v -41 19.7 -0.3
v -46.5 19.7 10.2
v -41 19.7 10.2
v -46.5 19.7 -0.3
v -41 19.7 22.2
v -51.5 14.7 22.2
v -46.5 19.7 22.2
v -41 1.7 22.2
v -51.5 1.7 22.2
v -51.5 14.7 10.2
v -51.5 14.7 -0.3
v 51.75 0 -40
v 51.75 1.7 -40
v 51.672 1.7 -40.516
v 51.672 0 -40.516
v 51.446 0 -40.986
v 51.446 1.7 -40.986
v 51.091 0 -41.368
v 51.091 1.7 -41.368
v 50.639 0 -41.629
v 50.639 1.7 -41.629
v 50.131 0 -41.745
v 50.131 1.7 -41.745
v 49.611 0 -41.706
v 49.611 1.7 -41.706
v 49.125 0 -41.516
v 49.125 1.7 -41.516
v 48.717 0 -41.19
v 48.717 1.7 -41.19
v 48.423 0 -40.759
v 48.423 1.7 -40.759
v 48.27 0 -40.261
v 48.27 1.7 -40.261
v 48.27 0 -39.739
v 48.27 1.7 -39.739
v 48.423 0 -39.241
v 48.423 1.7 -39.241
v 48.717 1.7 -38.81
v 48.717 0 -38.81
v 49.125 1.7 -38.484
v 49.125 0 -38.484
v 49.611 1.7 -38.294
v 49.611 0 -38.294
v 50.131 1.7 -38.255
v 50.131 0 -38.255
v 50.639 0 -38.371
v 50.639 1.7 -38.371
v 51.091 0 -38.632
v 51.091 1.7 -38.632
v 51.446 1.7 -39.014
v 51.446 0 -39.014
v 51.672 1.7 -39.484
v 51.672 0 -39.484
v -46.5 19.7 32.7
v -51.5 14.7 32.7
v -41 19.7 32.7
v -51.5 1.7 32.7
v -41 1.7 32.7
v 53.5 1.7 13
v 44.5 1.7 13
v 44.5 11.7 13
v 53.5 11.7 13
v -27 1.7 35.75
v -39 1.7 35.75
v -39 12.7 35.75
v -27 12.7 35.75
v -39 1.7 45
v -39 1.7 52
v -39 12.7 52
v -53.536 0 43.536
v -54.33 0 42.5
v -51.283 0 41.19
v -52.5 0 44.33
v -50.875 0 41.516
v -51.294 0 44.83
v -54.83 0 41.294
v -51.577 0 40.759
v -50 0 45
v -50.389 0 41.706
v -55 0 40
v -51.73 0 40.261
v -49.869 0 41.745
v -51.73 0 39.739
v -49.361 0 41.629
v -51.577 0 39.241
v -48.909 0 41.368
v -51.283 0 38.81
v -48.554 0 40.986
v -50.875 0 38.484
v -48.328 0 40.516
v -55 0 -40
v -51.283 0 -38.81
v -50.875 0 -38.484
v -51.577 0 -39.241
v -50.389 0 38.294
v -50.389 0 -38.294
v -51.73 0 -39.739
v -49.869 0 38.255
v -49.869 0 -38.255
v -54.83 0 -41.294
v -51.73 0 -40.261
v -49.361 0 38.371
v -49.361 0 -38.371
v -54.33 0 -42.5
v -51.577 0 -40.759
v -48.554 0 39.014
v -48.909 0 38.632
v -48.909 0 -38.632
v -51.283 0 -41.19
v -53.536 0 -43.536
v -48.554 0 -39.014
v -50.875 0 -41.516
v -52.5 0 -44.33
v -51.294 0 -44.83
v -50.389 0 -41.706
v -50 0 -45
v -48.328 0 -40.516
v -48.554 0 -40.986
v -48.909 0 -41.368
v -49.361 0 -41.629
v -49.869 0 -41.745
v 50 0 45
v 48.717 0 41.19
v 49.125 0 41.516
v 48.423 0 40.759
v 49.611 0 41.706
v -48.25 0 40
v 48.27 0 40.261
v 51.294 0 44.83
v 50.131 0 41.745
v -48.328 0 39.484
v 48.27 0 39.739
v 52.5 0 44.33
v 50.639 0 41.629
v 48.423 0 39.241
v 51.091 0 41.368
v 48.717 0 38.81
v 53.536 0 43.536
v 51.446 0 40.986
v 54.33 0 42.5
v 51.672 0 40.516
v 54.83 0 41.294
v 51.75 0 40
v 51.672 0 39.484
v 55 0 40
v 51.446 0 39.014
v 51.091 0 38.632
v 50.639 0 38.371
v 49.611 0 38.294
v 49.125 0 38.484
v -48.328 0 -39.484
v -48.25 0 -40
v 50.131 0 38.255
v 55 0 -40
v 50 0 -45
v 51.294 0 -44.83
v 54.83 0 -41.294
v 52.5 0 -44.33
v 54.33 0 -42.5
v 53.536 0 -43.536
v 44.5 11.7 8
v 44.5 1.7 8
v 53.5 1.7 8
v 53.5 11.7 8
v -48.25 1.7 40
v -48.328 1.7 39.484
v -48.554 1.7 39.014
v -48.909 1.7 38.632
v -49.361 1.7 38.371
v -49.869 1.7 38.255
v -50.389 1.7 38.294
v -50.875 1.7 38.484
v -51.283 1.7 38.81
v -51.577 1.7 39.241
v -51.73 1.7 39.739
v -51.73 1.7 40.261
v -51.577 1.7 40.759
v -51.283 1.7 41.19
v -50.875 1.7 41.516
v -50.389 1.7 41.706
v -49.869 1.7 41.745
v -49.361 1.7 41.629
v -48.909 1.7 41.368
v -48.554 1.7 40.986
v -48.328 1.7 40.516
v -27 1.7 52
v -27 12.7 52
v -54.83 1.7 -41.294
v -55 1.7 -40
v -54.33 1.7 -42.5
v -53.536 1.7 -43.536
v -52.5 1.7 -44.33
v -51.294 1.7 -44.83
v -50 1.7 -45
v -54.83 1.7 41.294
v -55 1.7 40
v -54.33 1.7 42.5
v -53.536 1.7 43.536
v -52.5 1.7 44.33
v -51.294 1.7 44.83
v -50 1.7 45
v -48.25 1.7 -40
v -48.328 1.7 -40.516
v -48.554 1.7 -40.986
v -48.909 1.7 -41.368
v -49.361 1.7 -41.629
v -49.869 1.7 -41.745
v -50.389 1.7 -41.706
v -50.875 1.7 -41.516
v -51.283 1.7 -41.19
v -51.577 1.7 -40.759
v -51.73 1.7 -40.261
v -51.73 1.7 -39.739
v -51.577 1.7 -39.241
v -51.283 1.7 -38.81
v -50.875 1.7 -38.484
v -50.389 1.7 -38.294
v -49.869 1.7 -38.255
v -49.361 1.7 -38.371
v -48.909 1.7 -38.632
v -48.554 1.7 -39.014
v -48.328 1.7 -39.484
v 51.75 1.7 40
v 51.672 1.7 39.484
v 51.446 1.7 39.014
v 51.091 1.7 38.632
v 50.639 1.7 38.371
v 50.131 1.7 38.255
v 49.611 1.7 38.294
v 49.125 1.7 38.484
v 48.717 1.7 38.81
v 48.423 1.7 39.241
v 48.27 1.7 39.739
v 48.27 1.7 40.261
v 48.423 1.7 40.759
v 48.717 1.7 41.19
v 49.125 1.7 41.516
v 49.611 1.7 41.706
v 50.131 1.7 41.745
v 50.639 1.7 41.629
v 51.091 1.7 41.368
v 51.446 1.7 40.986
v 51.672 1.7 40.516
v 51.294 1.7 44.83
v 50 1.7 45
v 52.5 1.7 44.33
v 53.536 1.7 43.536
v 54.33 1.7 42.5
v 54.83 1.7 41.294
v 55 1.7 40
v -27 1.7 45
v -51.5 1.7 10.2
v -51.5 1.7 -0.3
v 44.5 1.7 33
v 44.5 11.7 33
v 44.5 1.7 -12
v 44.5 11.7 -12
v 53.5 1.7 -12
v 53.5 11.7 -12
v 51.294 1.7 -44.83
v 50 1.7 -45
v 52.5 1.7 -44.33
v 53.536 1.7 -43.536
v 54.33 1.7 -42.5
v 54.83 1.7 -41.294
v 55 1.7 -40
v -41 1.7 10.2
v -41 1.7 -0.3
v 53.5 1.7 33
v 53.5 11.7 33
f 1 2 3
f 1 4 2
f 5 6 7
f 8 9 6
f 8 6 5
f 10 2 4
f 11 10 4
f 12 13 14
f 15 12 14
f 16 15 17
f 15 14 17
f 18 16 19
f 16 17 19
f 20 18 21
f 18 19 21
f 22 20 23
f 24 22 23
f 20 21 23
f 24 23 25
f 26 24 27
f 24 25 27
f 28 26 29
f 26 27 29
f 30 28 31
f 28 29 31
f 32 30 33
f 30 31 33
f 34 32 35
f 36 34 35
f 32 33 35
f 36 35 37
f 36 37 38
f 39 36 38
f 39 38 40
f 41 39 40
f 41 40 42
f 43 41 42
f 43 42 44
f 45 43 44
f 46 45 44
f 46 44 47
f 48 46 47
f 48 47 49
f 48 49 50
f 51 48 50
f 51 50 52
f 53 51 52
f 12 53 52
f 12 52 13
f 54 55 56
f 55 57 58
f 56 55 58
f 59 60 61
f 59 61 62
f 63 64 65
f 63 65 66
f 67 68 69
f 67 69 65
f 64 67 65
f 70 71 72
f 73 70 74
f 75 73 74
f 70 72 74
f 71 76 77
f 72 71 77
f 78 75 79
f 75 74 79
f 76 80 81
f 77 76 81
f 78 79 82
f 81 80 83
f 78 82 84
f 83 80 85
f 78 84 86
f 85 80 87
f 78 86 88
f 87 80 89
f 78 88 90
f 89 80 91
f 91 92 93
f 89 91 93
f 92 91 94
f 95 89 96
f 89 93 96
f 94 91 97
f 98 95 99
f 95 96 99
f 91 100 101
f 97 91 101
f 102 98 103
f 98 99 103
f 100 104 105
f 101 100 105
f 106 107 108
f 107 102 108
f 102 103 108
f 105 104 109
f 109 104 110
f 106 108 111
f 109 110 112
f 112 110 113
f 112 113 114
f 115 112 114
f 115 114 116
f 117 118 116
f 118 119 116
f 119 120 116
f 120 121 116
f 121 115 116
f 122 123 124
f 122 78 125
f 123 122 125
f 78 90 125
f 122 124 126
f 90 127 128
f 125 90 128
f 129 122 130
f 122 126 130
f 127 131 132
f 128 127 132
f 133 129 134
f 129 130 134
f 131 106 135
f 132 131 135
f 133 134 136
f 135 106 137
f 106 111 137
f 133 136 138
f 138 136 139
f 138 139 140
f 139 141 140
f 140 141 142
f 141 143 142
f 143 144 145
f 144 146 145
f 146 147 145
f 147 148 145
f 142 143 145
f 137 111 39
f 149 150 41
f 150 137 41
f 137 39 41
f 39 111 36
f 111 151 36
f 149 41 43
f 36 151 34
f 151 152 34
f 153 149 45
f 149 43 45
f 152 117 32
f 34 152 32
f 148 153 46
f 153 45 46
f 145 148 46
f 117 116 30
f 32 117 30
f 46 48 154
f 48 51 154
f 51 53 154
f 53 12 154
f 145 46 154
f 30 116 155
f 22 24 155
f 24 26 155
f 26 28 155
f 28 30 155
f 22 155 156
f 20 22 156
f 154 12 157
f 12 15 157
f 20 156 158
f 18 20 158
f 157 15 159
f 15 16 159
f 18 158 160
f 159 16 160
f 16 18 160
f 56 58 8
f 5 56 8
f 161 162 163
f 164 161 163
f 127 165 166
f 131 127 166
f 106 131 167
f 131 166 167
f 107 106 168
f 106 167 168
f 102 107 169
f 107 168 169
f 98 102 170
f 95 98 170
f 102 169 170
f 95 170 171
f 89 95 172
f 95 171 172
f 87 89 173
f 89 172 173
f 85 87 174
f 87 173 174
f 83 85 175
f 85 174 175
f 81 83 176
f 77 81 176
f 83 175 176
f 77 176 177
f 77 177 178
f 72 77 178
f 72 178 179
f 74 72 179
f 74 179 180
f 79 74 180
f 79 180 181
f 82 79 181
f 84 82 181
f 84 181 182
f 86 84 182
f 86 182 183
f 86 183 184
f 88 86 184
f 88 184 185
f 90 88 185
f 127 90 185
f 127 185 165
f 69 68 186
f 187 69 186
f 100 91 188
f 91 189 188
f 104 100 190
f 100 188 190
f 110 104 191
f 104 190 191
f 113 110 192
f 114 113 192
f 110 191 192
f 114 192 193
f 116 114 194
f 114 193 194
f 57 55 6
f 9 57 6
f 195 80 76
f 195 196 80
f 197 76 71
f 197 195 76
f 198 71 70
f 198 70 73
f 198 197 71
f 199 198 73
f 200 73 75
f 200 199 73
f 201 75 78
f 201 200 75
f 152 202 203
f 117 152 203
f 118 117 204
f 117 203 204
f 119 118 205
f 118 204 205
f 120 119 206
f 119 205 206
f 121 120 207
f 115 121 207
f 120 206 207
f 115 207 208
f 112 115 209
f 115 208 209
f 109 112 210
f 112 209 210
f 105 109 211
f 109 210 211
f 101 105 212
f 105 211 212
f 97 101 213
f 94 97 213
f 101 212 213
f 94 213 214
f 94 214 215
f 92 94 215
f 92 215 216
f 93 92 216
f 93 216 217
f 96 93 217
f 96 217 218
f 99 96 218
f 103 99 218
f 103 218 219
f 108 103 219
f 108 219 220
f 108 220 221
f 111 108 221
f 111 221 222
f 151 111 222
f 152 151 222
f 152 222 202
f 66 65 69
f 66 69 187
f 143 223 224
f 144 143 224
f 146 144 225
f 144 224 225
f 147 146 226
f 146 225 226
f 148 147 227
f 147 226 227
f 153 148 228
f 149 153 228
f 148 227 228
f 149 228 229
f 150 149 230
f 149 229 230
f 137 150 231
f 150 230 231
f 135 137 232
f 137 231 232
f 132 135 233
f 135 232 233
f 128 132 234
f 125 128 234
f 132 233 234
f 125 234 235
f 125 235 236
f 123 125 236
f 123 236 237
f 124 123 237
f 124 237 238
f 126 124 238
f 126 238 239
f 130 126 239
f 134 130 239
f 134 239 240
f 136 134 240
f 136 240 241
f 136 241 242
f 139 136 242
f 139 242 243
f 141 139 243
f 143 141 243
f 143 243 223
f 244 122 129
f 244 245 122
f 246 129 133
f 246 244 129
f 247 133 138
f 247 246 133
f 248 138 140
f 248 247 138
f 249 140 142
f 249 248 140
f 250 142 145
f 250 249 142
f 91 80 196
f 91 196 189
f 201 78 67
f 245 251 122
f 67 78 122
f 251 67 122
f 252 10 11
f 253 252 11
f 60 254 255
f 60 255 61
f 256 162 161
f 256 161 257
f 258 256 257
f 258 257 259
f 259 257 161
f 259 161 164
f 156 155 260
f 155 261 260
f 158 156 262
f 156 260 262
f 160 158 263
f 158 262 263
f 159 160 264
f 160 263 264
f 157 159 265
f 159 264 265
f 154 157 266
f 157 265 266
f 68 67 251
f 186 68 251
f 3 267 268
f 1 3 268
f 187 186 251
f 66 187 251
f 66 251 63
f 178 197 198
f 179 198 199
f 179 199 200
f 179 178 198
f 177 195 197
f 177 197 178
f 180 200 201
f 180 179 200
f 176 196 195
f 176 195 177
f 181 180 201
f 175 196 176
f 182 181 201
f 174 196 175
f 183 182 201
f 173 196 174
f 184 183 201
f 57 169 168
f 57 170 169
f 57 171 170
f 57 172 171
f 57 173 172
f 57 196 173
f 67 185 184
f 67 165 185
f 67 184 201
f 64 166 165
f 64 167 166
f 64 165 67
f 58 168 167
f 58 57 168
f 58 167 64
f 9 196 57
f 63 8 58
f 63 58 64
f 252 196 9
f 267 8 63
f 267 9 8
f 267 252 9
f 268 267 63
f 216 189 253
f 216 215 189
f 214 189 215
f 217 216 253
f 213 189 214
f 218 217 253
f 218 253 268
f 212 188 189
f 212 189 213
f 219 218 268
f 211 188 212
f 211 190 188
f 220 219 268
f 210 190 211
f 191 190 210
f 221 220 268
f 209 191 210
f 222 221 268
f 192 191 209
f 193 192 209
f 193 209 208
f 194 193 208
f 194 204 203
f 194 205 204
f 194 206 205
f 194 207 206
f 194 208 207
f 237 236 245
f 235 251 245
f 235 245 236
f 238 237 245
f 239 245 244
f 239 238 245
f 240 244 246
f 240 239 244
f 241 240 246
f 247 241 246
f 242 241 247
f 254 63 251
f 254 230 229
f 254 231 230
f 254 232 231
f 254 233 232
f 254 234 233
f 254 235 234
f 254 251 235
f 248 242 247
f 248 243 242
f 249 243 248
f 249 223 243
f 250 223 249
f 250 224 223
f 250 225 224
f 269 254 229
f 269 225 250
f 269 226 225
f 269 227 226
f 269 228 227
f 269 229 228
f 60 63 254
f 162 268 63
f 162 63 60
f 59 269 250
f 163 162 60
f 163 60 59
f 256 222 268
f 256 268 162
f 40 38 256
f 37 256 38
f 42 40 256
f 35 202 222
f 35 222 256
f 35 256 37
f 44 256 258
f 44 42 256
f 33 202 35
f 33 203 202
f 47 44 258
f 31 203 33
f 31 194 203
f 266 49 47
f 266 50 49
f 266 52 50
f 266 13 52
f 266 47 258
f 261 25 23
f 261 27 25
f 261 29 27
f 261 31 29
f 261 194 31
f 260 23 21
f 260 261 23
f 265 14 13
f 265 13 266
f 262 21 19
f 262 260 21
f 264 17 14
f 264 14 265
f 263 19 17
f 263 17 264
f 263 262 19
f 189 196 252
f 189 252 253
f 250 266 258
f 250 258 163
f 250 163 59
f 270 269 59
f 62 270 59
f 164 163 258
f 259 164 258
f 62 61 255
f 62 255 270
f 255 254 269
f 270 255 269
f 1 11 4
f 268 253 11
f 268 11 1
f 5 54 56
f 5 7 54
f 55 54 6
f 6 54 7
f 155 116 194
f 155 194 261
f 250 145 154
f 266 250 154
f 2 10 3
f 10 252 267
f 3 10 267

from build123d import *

# Parameters (mm, degrees)
SKETCH1_W                      = 110
SKETCH1_H                      = 90
BOSS_EXTRUDE1_DEPTH            = 1.7
CUT_EXTRUDE1_REACH             = 3.7
SKETCH2_R                      = 1.75
CUT_EXTRUDE1_DIRECTION_2_DEPTH = 1
FILLET1_R                      = 5
SKETCH3_W                      = 10.5
SKETCH3_H                      = 10.5
BOSS_EXTRUDE2_DEPTH            = 18
CHAMFER1_SIZE                  = 5
SKETCH4_W                      = 12
SKETCH4_H                      = 16.25
BOSS_EXTRUDE3_DEPTH            = 11
SKETCH5_W                      = 9
SKETCH5_H                      = 20
BOSS_EXTRUDE4_DEPTH            = 10


with BuildPart() as part:
    # Sketch1 → Boss-Extrude1 (new body)
    with BuildSketch(Plane(origin=(0, 0, 0), x_dir=(1, 0, 0), z_dir=(0, 1, 0))):
        Rectangle(SKETCH1_W, SKETCH1_H)
    extrude(amount=BOSS_EXTRUDE1_DEPTH)

    # Sketch2 → Cut-Extrude1 (cut, up to next)
    with BuildSketch(Plane(origin=(0, 1.7, 0), x_dir=(1, 0, 0), z_dir=(0, 1, 0)), mode=Mode.PRIVATE) as cut_extrude1_sk1:
        with Locations((-50, 40)):
            Circle(SKETCH2_R)
    cut_extrude1_tool1 = extrude(cut_extrude1_sk1.sketch, amount=-CUT_EXTRUDE1_REACH, mode=Mode.PRIVATE) & part.part
    add(cut_extrude1_tool1.solids().sort_by_distance((-50, 1.7, -40))[0], mode=Mode.SUBTRACT)
    # Sketch2 → Cut-Extrude1 (cut, up to next)
    with BuildSketch(Plane(origin=(0, 1.7, 0), x_dir=(1, 0, 0), z_dir=(0, 1, 0)), mode=Mode.PRIVATE) as cut_extrude1_sk2:
        with Locations((-50, -40)):
            Circle(SKETCH2_R)
    cut_extrude1_tool2 = extrude(cut_extrude1_sk2.sketch, amount=-CUT_EXTRUDE1_REACH, mode=Mode.PRIVATE) & part.part
    add(cut_extrude1_tool2.solids().sort_by_distance((-50, 1.7, 40))[0], mode=Mode.SUBTRACT)
    # Sketch2 → Cut-Extrude1 (cut, up to next)
    with BuildSketch(Plane(origin=(0, 1.7, 0), x_dir=(1, 0, 0), z_dir=(0, 1, 0)), mode=Mode.PRIVATE) as cut_extrude1_sk3:
        with Locations((50, -40)):
            Circle(SKETCH2_R)
    cut_extrude1_tool3 = extrude(cut_extrude1_sk3.sketch, amount=-CUT_EXTRUDE1_REACH, mode=Mode.PRIVATE) & part.part
    add(cut_extrude1_tool3.solids().sort_by_distance((50, 1.7, 40))[0], mode=Mode.SUBTRACT)
    # Sketch2 → Cut-Extrude1 (cut, up to next)
    with BuildSketch(Plane(origin=(0, 1.7, 0), x_dir=(1, 0, 0), z_dir=(0, 1, 0)), mode=Mode.PRIVATE) as cut_extrude1_sk4:
        with Locations((50, 40)):
            Circle(SKETCH2_R)
    cut_extrude1_tool4 = extrude(cut_extrude1_sk4.sketch, amount=-CUT_EXTRUDE1_REACH, mode=Mode.PRIVATE) & part.part
    add(cut_extrude1_tool4.solids().sort_by_distance((50, 1.7, -40))[0], mode=Mode.SUBTRACT)

    # Sketch2 → Cut-Extrude1 direction 2 (cut)
    with BuildSketch(Plane(origin=(0, 1.7, 0), x_dir=(1, 0, 0), z_dir=(0, 1, 0))):
        with Locations((-50, 40)):
            Circle(SKETCH2_R)
        with Locations((-50, -40)):
            Circle(SKETCH2_R)
        with Locations((50, -40)):
            Circle(SKETCH2_R)
        with Locations((50, 40)):
            Circle(SKETCH2_R)
    extrude(amount=CUT_EXTRUDE1_DIRECTION_2_DEPTH, mode=Mode.SUBTRACT)

    # Fillet1
    fillet1_edges = [part.edges().sort_by_distance(p)[0] for p in [
        (55, 0.85, 45),
        (-55, 0.85, 45),
        (-55, 0.85, -45),
        (55, 0.85, -45),
    ]]
    fillet(fillet1_edges, radius=FILLET1_R)

    # Sketch3 → Boss-Extrude2 (add)
    with BuildSketch(Plane(origin=(0, 1.7, 0), x_dir=(1, 0, 0), z_dir=(0, 1, 0))):
        with Locations((-46.25, -27.45)):
            Rectangle(SKETCH3_W, SKETCH3_H)
        with Locations((-46.25, -4.95)):
            Rectangle(SKETCH3_W, SKETCH3_H)
    extrude(amount=BOSS_EXTRUDE2_DEPTH)

    # Chamfer1
    chamfer1_edges = [part.edges().sort_by_distance(p)[0] for p in [
        (-51.5, 19.7, 27.45),
        (-51.5, 19.7, 4.95),
    ]]
    chamfer(chamfer1_edges, length=CHAMFER1_SIZE)

    # Sketch4 → Boss-Extrude3 (add)
    with BuildSketch(Plane(origin=(0, 1.7, 0), x_dir=(1, 0, 0), z_dir=(0, 1, 0))):
        with Locations((-33, -43.875)):
            Rectangle(SKETCH4_W, SKETCH4_H)
    extrude(amount=BOSS_EXTRUDE3_DEPTH)

    # Sketch5 → Boss-Extrude4 (add)
    with BuildSketch(Plane(origin=(0, 1.7, 0), x_dir=(1, 0, 0), z_dir=(0, 1, 0))):
        with Locations((49, -23)):
            Rectangle(SKETCH5_W, SKETCH5_H)
        with Locations((49, 2)):
            Rectangle(SKETCH5_W, SKETCH5_H)
    extrude(amount=BOSS_EXTRUDE4_DEPTH)


solid = part.part
